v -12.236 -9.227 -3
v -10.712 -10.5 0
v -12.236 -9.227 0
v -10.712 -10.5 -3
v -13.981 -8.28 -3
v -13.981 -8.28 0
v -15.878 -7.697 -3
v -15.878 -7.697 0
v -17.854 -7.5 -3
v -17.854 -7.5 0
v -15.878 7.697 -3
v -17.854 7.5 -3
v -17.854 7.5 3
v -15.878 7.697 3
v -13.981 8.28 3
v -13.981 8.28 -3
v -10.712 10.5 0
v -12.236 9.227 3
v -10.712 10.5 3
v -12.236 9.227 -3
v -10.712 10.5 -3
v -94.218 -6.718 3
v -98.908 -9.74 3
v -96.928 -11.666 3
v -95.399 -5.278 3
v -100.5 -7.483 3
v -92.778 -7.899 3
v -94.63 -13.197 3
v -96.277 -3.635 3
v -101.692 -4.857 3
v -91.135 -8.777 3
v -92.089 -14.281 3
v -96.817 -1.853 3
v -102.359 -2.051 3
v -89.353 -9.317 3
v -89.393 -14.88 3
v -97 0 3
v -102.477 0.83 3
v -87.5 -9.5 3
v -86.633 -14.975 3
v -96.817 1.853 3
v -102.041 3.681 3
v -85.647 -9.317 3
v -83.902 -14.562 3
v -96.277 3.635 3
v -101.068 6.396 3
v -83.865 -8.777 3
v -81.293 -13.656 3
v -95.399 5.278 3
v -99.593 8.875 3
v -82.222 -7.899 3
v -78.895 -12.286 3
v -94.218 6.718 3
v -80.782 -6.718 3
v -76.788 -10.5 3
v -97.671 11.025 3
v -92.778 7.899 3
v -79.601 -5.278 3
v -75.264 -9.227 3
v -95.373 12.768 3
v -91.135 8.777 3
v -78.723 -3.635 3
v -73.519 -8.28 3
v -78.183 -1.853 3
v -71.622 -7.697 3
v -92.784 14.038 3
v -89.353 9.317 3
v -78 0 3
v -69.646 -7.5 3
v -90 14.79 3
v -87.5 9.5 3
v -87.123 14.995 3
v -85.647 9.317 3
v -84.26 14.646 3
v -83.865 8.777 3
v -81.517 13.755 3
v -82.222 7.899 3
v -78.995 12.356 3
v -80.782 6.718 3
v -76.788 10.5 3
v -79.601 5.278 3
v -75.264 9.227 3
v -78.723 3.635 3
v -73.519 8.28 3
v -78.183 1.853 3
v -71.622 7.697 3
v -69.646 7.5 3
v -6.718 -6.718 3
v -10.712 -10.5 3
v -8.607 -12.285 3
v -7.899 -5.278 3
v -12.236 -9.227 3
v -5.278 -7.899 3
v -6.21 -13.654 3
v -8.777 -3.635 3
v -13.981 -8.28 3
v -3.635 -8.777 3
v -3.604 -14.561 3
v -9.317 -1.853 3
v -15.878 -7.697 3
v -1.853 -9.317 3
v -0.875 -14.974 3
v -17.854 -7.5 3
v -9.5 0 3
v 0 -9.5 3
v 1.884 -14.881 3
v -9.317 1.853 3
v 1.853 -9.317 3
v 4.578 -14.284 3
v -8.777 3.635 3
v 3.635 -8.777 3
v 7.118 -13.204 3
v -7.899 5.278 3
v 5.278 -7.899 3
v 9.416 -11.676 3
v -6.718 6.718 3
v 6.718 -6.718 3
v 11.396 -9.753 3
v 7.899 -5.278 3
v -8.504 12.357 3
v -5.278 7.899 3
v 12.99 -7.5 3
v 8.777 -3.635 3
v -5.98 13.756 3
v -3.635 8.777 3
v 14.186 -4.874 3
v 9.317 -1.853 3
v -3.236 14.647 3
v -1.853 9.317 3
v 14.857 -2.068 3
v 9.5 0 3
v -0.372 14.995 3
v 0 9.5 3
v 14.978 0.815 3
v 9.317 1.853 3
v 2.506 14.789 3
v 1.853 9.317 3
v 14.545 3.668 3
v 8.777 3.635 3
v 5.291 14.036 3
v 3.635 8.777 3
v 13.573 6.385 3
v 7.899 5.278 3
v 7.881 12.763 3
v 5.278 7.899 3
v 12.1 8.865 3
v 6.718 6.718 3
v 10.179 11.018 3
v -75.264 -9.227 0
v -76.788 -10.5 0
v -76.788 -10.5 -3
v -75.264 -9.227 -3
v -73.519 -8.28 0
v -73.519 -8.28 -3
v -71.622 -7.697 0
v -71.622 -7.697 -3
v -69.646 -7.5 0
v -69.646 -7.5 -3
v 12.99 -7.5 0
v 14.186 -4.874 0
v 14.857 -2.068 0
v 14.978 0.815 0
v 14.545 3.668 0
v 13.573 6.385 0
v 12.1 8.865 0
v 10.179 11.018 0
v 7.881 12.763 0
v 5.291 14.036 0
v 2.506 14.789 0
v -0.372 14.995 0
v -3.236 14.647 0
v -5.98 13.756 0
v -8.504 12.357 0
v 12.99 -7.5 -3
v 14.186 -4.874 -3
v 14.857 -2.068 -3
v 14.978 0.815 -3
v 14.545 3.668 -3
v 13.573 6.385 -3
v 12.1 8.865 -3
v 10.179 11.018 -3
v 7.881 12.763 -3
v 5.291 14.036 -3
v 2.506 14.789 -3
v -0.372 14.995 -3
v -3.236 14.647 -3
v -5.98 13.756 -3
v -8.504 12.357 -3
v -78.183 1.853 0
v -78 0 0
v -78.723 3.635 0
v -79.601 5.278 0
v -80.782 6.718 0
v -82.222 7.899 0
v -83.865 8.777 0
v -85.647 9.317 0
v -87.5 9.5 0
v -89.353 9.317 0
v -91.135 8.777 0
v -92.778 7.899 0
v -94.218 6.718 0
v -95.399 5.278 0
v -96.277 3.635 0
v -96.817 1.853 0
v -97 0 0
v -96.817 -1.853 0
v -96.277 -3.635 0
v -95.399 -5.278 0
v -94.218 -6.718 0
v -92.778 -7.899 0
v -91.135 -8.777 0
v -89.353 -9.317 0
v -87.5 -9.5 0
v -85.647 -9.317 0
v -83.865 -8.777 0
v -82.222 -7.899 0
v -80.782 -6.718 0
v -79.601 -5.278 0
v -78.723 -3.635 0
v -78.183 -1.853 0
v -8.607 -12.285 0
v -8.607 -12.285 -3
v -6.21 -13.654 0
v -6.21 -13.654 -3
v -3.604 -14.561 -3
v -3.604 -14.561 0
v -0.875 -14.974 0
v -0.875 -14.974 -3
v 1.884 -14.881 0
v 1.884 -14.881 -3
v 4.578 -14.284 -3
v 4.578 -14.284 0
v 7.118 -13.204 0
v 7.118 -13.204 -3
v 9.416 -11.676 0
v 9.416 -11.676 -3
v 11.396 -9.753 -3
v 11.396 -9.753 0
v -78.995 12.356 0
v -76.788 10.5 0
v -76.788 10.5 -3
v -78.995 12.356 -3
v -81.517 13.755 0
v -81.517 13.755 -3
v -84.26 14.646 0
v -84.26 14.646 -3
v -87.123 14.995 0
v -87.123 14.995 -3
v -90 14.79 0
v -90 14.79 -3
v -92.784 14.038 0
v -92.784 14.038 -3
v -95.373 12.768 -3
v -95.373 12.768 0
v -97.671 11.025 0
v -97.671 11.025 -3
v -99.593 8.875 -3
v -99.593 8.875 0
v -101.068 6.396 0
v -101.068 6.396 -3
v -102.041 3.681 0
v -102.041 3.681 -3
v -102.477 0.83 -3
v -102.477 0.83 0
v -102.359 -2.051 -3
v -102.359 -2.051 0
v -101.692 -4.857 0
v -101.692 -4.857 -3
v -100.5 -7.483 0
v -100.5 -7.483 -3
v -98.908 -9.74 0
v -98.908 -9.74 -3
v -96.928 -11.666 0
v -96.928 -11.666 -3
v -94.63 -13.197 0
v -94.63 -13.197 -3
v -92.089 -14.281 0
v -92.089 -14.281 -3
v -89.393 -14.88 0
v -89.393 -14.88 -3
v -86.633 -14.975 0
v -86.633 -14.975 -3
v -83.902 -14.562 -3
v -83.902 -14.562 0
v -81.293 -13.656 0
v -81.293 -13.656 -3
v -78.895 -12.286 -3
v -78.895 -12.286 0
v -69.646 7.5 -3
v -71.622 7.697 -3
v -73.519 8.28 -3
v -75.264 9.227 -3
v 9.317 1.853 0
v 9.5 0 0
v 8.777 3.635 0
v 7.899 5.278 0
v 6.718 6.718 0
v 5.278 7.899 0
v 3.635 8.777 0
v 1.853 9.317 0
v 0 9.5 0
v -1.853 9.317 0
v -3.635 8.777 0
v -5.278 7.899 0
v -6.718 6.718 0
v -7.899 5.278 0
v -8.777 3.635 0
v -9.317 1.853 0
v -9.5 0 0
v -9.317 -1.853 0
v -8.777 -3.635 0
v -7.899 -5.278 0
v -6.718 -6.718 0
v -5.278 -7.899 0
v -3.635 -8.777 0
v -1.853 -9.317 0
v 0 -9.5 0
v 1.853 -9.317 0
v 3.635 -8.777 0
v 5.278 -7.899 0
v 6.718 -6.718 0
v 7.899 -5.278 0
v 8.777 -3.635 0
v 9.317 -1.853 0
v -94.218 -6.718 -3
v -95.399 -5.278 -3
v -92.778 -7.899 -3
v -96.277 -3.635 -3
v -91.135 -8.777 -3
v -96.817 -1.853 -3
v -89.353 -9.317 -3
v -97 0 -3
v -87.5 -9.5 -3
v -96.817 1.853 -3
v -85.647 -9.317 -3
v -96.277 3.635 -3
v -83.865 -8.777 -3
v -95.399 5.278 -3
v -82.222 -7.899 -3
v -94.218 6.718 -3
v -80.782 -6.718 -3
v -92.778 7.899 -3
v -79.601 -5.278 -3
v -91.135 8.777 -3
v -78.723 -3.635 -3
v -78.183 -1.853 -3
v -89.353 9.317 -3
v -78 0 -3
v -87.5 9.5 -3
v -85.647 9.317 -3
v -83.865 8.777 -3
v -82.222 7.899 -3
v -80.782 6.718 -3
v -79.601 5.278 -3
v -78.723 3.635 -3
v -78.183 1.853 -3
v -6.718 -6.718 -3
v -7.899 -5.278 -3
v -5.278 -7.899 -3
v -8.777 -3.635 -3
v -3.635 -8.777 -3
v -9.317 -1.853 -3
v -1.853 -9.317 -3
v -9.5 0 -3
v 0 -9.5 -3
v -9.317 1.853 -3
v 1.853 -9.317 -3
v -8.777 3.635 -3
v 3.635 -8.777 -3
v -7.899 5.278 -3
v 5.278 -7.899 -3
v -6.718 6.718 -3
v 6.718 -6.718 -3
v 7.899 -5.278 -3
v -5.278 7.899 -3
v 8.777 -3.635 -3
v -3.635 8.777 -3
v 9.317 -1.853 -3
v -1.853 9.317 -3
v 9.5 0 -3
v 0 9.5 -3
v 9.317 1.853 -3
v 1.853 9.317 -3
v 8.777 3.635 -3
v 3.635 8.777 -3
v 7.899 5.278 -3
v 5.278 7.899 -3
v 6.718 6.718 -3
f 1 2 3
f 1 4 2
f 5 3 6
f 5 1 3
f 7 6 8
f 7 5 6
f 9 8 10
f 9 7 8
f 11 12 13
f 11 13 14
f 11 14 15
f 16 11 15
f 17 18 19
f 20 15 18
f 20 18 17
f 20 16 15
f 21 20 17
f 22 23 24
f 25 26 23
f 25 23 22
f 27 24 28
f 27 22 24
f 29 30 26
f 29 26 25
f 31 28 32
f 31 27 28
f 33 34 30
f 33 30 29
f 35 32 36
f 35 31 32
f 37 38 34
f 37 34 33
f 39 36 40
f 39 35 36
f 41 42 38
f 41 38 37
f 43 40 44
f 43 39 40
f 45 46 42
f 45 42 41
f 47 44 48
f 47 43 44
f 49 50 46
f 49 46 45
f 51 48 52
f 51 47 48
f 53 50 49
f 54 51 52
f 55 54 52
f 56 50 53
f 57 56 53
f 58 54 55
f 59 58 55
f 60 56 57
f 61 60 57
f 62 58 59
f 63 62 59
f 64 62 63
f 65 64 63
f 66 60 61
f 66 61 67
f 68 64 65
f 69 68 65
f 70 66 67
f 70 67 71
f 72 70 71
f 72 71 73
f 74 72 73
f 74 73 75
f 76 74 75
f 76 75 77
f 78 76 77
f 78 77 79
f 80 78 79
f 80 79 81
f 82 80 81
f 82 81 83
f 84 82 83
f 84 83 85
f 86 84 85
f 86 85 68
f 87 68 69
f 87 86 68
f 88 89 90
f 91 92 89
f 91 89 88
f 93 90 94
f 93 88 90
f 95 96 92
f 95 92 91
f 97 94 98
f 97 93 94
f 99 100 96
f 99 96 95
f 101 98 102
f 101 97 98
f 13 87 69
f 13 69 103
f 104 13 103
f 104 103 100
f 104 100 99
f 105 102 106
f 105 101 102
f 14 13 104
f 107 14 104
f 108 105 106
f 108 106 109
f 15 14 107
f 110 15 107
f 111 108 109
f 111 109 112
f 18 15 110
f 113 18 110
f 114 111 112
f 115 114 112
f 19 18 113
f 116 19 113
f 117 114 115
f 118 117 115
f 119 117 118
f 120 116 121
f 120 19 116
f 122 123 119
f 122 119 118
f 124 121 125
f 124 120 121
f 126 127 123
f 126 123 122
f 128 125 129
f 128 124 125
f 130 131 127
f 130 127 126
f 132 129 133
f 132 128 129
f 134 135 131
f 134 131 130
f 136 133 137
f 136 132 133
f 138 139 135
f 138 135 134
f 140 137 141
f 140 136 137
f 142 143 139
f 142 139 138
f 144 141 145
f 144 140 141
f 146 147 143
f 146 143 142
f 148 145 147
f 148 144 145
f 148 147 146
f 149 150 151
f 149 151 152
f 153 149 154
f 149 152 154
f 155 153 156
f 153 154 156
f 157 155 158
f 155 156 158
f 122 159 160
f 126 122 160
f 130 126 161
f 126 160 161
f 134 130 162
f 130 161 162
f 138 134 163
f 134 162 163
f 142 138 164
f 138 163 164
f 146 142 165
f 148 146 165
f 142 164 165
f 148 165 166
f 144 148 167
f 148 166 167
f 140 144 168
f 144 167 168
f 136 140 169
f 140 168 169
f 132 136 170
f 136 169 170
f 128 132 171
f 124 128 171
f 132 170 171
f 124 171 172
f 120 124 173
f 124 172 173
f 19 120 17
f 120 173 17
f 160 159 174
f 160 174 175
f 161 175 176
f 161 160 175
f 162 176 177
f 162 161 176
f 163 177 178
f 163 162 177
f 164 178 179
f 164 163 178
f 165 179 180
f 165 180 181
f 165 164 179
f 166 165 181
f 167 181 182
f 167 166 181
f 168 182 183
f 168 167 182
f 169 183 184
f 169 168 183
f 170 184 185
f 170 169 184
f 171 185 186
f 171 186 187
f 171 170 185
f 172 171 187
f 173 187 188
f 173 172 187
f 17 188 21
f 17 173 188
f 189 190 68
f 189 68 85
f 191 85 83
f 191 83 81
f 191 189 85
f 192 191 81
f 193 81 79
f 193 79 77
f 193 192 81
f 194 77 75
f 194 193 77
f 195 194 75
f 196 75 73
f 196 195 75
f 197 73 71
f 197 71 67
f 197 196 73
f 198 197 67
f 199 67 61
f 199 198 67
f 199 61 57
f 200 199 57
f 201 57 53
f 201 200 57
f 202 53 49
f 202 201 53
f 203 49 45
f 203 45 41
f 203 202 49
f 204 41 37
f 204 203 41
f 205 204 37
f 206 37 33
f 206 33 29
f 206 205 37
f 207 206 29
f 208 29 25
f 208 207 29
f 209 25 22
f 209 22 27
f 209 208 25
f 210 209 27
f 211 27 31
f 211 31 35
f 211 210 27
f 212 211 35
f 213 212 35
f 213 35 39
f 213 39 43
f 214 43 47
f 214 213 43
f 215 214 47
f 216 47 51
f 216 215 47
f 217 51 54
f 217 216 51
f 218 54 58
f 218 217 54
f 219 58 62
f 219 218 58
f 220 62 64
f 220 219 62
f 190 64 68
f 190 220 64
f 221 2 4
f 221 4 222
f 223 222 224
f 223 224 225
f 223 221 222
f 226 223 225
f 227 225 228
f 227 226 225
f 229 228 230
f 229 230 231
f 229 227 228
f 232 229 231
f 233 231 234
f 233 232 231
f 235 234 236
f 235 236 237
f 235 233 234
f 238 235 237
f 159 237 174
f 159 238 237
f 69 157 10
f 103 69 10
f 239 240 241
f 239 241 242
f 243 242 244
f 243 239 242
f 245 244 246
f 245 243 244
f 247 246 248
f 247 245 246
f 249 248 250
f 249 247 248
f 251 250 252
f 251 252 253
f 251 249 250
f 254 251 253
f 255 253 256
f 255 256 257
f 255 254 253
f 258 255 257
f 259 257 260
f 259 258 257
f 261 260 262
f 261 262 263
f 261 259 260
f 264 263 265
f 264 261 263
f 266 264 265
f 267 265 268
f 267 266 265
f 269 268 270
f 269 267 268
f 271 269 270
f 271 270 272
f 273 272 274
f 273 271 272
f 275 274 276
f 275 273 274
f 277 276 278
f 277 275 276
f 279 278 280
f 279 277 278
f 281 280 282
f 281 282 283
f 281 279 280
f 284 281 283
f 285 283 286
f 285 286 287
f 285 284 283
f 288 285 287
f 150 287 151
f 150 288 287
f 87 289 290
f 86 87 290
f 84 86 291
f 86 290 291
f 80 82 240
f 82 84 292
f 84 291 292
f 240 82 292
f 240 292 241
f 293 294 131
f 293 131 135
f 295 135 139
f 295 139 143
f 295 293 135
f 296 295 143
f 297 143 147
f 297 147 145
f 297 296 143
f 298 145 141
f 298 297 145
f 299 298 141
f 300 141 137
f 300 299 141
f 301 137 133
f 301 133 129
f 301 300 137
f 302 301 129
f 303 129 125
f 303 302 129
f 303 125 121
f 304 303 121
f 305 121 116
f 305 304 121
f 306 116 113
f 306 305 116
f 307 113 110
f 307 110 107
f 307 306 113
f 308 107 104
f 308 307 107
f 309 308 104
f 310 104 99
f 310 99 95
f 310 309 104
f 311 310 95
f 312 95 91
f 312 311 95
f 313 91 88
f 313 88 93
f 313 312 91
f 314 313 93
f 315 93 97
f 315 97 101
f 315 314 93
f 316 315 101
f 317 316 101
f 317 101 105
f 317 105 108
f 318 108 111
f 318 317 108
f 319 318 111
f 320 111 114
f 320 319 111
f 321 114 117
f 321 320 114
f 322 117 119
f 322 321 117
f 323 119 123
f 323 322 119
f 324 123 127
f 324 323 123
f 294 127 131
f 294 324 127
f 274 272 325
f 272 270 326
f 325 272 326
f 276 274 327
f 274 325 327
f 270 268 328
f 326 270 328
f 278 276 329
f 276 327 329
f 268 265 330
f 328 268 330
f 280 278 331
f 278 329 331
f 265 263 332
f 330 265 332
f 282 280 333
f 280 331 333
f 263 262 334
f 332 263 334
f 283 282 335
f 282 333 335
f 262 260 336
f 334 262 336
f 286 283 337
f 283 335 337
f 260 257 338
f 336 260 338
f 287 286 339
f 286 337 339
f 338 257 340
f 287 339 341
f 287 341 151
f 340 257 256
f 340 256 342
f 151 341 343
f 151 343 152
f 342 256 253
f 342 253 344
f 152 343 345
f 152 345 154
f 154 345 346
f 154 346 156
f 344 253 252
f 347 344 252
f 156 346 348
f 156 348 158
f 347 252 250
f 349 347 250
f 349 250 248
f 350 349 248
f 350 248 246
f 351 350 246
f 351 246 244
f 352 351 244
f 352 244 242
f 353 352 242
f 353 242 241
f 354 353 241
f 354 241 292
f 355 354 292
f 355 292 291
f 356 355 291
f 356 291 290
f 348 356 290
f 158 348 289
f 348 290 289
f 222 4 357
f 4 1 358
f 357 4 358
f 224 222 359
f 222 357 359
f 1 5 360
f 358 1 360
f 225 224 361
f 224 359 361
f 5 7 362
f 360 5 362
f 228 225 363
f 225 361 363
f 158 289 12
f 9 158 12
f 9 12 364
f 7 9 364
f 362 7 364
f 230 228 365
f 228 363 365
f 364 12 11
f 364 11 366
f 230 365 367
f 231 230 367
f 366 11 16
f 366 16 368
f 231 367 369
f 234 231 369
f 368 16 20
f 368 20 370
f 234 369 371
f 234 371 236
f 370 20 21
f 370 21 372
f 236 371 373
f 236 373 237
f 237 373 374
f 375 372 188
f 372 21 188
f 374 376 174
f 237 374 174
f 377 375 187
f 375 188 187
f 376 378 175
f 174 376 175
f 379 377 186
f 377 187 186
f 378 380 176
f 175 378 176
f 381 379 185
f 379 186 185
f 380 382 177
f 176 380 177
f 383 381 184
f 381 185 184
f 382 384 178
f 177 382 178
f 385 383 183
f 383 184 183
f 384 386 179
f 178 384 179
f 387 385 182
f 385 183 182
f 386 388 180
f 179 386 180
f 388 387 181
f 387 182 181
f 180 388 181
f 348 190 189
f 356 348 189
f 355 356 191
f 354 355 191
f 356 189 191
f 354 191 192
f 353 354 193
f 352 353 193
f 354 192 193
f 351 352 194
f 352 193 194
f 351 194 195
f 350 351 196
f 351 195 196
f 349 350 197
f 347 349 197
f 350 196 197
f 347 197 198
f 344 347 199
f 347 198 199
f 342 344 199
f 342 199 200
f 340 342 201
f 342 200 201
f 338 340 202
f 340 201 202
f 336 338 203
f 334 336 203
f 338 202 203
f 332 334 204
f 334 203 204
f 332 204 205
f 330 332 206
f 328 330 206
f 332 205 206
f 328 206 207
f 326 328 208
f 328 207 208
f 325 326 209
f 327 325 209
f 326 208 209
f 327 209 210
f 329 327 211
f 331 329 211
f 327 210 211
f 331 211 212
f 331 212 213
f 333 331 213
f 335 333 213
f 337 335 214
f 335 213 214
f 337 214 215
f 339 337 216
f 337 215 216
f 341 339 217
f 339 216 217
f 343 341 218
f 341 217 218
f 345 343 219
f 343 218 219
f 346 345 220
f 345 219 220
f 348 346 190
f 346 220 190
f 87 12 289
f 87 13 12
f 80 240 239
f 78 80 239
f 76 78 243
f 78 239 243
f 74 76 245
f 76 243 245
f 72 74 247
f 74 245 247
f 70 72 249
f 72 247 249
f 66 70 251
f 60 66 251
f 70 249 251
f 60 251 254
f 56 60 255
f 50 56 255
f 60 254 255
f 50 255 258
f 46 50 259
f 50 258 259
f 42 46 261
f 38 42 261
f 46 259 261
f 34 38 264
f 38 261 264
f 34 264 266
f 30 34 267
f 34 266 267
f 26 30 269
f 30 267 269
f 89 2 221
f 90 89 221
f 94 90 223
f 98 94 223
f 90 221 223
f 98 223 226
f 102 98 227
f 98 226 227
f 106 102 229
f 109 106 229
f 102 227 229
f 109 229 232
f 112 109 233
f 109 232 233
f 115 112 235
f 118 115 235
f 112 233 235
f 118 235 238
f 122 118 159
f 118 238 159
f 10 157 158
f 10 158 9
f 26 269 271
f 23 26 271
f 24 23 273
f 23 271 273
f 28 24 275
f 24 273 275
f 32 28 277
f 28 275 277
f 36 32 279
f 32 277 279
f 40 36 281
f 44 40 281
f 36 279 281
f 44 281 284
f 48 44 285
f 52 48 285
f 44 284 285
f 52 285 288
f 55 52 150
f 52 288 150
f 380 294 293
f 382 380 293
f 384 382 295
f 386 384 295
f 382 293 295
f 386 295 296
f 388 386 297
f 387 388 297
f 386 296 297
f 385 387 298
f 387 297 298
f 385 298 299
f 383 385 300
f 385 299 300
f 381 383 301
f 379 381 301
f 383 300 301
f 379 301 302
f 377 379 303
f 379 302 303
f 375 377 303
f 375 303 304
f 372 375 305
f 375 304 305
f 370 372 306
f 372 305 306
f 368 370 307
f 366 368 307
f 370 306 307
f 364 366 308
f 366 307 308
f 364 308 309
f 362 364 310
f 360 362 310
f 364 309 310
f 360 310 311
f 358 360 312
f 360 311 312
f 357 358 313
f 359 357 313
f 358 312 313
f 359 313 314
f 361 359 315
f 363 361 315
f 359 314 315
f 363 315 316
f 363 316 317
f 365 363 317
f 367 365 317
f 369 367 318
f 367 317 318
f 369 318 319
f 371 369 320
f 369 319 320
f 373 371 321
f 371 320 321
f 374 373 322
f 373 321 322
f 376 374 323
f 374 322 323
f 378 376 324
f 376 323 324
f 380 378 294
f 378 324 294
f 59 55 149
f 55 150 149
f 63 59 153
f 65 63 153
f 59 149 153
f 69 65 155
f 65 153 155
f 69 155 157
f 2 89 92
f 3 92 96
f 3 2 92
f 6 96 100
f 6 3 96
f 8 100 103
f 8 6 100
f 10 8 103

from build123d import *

# Parameters (mm, degrees)
SZKIC1_R                    = 9.5
DODANIE_WYCI_GNI_CIE1_DEPTH = 3
ZAOKR_GLENIE1_R             = 10


with BuildPart() as part:
    # Szkic1 → Dodanie-wyciągnięcie1 (new, symmetric)
    with BuildSketch(Plane.XY):
        with BuildLine():
            Line((-12.990381057, 7.5), (-74.509618943, 7.5))
            ThreePointArc((-74.509618943, 7.5), (-94.991658931, 12.995193206), (-100.5, -7.483314774))
            ThreePointArc((-100.5, -7.483314774), (-87.509629653, -14.999996909), (-74.509618943, -7.5))
            Line((-74.509618943, -7.5), (-12.990381057, -7.5))
            ThreePointArc((-12.990381057, -7.5), (0, -15), (12.990381057, -7.5))
            ThreePointArc((12.990381057, -7.5), (7.5, 12.990381057), (-12.990381057, 7.5))
        make_face()
        with Locations((-87.5, 0)):
            Circle(SZKIC1_R, mode=Mode.SUBTRACT)
        Circle(SZKIC1_R, mode=Mode.SUBTRACT)
    extrude(amount=DODANIE_WYCI_GNI_CIE1_DEPTH, both=True)

    # Zaokrąglenie1
    zaokr_glenie1_edges = [part.edges().sort_by_distance(p)[0] for p in [
        (-74.509618943, 7.5, -1.5),
        (-12.990381057, 7.5, -1.5),
        (-12.990381057, -7.5, -1.5),
        (-74.509618943, -7.5, -1.5),
    ]]
    fillet(zaokr_glenie1_edges, radius=ZAOKR_GLENIE1_R)


solid = part.part
